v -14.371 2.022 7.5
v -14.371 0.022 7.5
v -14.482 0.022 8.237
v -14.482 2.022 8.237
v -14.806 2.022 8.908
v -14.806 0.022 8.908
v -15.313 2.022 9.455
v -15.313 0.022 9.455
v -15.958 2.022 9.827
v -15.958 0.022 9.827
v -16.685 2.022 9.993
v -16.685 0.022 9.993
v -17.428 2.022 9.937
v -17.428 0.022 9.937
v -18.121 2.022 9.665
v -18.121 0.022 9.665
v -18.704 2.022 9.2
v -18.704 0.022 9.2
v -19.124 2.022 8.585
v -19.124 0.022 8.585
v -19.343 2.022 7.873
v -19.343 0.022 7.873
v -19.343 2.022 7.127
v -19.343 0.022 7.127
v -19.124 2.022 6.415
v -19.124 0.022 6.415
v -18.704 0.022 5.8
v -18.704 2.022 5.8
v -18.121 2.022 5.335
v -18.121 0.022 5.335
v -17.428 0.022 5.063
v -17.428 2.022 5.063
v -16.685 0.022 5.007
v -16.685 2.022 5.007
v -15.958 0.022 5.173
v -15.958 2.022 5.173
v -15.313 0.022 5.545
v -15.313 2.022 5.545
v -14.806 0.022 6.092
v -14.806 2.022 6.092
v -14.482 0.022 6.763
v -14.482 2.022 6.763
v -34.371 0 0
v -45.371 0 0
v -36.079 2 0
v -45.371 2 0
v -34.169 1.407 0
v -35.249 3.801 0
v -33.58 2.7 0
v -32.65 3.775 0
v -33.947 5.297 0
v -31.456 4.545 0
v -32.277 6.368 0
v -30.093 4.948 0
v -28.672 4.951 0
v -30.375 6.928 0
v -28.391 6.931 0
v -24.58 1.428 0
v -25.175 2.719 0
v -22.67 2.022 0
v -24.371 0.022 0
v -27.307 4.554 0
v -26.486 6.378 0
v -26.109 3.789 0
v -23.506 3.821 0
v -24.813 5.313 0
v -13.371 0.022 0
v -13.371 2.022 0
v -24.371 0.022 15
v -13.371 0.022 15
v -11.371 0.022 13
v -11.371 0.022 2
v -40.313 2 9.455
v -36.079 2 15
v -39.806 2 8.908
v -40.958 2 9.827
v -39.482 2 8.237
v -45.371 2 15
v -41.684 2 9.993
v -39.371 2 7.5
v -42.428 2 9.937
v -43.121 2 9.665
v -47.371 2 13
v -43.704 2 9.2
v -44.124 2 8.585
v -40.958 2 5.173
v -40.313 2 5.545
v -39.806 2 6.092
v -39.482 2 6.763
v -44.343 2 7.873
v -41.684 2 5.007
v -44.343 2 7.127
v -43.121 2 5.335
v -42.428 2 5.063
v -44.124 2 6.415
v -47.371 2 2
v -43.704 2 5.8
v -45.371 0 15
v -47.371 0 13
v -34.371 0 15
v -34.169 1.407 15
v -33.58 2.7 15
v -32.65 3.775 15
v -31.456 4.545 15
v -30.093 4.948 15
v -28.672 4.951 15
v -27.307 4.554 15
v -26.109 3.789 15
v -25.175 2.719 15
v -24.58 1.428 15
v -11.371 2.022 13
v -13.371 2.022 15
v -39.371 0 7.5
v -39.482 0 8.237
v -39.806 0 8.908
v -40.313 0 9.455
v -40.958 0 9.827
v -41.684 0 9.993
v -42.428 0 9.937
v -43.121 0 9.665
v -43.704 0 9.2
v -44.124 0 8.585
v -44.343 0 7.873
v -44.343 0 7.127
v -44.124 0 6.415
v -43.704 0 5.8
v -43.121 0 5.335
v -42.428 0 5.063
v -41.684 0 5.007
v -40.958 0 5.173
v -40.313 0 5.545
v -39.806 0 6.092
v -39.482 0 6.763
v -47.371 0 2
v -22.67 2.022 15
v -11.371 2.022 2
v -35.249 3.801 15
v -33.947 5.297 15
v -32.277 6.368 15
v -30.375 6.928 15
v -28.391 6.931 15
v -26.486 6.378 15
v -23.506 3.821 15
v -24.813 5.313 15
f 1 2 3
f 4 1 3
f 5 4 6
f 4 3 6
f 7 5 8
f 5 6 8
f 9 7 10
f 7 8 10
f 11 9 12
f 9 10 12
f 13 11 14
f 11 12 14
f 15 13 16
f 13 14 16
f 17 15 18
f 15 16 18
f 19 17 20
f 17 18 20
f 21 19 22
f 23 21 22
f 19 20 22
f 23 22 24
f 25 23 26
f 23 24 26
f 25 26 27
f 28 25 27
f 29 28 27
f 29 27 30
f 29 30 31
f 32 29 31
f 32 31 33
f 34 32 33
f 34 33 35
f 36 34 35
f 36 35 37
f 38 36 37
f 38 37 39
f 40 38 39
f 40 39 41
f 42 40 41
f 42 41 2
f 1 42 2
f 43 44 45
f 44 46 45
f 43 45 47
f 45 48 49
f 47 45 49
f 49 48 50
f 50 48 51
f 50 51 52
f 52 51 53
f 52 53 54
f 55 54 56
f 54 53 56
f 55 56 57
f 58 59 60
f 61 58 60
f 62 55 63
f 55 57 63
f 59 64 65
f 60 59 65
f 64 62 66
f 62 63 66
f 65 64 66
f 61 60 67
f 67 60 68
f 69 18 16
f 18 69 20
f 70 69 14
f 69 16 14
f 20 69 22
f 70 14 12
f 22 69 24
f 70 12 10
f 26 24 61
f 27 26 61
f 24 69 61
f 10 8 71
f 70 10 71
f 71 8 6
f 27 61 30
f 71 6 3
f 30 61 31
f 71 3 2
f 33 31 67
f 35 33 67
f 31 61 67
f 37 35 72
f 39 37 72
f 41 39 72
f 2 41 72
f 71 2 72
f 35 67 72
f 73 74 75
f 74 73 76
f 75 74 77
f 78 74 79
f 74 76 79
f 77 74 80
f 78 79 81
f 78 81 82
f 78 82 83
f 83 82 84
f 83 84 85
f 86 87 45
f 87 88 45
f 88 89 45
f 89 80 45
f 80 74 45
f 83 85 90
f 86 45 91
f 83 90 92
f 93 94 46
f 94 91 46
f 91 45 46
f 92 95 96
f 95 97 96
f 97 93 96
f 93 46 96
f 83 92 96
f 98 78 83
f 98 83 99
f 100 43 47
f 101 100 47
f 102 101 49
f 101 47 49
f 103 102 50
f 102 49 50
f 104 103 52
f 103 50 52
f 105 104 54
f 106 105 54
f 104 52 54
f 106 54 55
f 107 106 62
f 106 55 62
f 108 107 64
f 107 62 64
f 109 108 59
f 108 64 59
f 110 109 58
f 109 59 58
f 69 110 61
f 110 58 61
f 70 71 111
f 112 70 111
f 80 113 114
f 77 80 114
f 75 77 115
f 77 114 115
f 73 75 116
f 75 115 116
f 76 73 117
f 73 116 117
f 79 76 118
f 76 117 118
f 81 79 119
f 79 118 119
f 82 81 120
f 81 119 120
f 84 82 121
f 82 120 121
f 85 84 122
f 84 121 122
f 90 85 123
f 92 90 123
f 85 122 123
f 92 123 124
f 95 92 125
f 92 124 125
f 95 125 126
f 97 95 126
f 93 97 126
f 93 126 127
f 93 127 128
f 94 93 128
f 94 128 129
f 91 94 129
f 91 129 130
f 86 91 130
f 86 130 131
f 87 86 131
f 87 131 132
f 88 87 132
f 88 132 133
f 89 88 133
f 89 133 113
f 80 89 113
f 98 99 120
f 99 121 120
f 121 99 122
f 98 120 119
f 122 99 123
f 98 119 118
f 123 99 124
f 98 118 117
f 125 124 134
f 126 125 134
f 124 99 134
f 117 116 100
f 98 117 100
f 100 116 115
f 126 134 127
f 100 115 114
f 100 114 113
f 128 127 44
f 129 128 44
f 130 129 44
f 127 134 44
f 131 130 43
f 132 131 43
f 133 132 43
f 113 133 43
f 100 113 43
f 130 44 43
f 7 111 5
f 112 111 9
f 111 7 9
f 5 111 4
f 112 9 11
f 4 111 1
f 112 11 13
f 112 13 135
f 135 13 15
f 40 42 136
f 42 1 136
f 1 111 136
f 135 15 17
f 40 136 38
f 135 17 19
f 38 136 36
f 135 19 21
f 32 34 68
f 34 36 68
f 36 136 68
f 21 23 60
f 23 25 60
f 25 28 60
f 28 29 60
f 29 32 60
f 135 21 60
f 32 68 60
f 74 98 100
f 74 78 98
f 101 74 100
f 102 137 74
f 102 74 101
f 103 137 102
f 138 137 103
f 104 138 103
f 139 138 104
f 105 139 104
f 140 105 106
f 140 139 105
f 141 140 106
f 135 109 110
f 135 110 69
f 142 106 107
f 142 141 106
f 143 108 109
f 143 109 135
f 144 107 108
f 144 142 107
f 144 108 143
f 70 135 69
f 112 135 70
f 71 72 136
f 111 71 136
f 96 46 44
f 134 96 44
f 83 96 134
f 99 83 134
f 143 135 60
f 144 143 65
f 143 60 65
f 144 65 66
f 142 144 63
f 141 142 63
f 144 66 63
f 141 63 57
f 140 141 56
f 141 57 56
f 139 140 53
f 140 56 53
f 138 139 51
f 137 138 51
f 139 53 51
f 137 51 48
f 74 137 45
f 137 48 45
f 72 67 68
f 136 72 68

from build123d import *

# Parameters (mm, degrees)
F1_DEPTH = 15
F2_R     = 2.5
F3_DEPTH = 7.001
F4_SIZE  = 2


with BuildPart() as f1:
    # F0 (on Top) → F1 (new body)
    with BuildSketch(Plane.XY):
        with BuildLine():
            Line((-47.371286, 2), (-47.371286, 0))
            Line((-47.371286, 0), (-34.371286, 0))
            ThreePointArc((-34.371286, 0), (-29.382447, 4.999988), (-24.371336, 0.022323))
            Line((-24.371336, 0.022323), (-11.371336, 0.022323))
            Line((-11.371336, 0.022323), (-11.371336, 2.022323))
            Line((-11.371336, 2.022323), (-22.669778, 2.022323))
            ThreePointArc((-22.669778, 2.022323), (-29.382938, 6.99999), (-36.07949, 2))
            Line((-36.07949, 2), (-47.371286, 2))
        make_face()
    extrude(amount=F1_DEPTH)

    # F2 (on Front) → F3 (cut, through all)
    with BuildSketch(Plane.XZ):
        with Locations((-41.871286, 7.5)):
            Circle(F2_R)
        with Locations((-16.871336, 7.5)):
            Circle(F2_R)
    extrude(amount=-F3_DEPTH, mode=Mode.SUBTRACT)

    # F4
    f4_edges = [f1.edges().sort_by_distance(p)[0] for p in [
        (-11.371336, 1.022323, 15),
        (-47.371286, 1, 15),
        (-11.371336, 1.022323, 0),
        (-47.371286, 1, 0),
    ]]
    chamfer(f4_edges, length=F4_SIZE)


solid = f1.part
